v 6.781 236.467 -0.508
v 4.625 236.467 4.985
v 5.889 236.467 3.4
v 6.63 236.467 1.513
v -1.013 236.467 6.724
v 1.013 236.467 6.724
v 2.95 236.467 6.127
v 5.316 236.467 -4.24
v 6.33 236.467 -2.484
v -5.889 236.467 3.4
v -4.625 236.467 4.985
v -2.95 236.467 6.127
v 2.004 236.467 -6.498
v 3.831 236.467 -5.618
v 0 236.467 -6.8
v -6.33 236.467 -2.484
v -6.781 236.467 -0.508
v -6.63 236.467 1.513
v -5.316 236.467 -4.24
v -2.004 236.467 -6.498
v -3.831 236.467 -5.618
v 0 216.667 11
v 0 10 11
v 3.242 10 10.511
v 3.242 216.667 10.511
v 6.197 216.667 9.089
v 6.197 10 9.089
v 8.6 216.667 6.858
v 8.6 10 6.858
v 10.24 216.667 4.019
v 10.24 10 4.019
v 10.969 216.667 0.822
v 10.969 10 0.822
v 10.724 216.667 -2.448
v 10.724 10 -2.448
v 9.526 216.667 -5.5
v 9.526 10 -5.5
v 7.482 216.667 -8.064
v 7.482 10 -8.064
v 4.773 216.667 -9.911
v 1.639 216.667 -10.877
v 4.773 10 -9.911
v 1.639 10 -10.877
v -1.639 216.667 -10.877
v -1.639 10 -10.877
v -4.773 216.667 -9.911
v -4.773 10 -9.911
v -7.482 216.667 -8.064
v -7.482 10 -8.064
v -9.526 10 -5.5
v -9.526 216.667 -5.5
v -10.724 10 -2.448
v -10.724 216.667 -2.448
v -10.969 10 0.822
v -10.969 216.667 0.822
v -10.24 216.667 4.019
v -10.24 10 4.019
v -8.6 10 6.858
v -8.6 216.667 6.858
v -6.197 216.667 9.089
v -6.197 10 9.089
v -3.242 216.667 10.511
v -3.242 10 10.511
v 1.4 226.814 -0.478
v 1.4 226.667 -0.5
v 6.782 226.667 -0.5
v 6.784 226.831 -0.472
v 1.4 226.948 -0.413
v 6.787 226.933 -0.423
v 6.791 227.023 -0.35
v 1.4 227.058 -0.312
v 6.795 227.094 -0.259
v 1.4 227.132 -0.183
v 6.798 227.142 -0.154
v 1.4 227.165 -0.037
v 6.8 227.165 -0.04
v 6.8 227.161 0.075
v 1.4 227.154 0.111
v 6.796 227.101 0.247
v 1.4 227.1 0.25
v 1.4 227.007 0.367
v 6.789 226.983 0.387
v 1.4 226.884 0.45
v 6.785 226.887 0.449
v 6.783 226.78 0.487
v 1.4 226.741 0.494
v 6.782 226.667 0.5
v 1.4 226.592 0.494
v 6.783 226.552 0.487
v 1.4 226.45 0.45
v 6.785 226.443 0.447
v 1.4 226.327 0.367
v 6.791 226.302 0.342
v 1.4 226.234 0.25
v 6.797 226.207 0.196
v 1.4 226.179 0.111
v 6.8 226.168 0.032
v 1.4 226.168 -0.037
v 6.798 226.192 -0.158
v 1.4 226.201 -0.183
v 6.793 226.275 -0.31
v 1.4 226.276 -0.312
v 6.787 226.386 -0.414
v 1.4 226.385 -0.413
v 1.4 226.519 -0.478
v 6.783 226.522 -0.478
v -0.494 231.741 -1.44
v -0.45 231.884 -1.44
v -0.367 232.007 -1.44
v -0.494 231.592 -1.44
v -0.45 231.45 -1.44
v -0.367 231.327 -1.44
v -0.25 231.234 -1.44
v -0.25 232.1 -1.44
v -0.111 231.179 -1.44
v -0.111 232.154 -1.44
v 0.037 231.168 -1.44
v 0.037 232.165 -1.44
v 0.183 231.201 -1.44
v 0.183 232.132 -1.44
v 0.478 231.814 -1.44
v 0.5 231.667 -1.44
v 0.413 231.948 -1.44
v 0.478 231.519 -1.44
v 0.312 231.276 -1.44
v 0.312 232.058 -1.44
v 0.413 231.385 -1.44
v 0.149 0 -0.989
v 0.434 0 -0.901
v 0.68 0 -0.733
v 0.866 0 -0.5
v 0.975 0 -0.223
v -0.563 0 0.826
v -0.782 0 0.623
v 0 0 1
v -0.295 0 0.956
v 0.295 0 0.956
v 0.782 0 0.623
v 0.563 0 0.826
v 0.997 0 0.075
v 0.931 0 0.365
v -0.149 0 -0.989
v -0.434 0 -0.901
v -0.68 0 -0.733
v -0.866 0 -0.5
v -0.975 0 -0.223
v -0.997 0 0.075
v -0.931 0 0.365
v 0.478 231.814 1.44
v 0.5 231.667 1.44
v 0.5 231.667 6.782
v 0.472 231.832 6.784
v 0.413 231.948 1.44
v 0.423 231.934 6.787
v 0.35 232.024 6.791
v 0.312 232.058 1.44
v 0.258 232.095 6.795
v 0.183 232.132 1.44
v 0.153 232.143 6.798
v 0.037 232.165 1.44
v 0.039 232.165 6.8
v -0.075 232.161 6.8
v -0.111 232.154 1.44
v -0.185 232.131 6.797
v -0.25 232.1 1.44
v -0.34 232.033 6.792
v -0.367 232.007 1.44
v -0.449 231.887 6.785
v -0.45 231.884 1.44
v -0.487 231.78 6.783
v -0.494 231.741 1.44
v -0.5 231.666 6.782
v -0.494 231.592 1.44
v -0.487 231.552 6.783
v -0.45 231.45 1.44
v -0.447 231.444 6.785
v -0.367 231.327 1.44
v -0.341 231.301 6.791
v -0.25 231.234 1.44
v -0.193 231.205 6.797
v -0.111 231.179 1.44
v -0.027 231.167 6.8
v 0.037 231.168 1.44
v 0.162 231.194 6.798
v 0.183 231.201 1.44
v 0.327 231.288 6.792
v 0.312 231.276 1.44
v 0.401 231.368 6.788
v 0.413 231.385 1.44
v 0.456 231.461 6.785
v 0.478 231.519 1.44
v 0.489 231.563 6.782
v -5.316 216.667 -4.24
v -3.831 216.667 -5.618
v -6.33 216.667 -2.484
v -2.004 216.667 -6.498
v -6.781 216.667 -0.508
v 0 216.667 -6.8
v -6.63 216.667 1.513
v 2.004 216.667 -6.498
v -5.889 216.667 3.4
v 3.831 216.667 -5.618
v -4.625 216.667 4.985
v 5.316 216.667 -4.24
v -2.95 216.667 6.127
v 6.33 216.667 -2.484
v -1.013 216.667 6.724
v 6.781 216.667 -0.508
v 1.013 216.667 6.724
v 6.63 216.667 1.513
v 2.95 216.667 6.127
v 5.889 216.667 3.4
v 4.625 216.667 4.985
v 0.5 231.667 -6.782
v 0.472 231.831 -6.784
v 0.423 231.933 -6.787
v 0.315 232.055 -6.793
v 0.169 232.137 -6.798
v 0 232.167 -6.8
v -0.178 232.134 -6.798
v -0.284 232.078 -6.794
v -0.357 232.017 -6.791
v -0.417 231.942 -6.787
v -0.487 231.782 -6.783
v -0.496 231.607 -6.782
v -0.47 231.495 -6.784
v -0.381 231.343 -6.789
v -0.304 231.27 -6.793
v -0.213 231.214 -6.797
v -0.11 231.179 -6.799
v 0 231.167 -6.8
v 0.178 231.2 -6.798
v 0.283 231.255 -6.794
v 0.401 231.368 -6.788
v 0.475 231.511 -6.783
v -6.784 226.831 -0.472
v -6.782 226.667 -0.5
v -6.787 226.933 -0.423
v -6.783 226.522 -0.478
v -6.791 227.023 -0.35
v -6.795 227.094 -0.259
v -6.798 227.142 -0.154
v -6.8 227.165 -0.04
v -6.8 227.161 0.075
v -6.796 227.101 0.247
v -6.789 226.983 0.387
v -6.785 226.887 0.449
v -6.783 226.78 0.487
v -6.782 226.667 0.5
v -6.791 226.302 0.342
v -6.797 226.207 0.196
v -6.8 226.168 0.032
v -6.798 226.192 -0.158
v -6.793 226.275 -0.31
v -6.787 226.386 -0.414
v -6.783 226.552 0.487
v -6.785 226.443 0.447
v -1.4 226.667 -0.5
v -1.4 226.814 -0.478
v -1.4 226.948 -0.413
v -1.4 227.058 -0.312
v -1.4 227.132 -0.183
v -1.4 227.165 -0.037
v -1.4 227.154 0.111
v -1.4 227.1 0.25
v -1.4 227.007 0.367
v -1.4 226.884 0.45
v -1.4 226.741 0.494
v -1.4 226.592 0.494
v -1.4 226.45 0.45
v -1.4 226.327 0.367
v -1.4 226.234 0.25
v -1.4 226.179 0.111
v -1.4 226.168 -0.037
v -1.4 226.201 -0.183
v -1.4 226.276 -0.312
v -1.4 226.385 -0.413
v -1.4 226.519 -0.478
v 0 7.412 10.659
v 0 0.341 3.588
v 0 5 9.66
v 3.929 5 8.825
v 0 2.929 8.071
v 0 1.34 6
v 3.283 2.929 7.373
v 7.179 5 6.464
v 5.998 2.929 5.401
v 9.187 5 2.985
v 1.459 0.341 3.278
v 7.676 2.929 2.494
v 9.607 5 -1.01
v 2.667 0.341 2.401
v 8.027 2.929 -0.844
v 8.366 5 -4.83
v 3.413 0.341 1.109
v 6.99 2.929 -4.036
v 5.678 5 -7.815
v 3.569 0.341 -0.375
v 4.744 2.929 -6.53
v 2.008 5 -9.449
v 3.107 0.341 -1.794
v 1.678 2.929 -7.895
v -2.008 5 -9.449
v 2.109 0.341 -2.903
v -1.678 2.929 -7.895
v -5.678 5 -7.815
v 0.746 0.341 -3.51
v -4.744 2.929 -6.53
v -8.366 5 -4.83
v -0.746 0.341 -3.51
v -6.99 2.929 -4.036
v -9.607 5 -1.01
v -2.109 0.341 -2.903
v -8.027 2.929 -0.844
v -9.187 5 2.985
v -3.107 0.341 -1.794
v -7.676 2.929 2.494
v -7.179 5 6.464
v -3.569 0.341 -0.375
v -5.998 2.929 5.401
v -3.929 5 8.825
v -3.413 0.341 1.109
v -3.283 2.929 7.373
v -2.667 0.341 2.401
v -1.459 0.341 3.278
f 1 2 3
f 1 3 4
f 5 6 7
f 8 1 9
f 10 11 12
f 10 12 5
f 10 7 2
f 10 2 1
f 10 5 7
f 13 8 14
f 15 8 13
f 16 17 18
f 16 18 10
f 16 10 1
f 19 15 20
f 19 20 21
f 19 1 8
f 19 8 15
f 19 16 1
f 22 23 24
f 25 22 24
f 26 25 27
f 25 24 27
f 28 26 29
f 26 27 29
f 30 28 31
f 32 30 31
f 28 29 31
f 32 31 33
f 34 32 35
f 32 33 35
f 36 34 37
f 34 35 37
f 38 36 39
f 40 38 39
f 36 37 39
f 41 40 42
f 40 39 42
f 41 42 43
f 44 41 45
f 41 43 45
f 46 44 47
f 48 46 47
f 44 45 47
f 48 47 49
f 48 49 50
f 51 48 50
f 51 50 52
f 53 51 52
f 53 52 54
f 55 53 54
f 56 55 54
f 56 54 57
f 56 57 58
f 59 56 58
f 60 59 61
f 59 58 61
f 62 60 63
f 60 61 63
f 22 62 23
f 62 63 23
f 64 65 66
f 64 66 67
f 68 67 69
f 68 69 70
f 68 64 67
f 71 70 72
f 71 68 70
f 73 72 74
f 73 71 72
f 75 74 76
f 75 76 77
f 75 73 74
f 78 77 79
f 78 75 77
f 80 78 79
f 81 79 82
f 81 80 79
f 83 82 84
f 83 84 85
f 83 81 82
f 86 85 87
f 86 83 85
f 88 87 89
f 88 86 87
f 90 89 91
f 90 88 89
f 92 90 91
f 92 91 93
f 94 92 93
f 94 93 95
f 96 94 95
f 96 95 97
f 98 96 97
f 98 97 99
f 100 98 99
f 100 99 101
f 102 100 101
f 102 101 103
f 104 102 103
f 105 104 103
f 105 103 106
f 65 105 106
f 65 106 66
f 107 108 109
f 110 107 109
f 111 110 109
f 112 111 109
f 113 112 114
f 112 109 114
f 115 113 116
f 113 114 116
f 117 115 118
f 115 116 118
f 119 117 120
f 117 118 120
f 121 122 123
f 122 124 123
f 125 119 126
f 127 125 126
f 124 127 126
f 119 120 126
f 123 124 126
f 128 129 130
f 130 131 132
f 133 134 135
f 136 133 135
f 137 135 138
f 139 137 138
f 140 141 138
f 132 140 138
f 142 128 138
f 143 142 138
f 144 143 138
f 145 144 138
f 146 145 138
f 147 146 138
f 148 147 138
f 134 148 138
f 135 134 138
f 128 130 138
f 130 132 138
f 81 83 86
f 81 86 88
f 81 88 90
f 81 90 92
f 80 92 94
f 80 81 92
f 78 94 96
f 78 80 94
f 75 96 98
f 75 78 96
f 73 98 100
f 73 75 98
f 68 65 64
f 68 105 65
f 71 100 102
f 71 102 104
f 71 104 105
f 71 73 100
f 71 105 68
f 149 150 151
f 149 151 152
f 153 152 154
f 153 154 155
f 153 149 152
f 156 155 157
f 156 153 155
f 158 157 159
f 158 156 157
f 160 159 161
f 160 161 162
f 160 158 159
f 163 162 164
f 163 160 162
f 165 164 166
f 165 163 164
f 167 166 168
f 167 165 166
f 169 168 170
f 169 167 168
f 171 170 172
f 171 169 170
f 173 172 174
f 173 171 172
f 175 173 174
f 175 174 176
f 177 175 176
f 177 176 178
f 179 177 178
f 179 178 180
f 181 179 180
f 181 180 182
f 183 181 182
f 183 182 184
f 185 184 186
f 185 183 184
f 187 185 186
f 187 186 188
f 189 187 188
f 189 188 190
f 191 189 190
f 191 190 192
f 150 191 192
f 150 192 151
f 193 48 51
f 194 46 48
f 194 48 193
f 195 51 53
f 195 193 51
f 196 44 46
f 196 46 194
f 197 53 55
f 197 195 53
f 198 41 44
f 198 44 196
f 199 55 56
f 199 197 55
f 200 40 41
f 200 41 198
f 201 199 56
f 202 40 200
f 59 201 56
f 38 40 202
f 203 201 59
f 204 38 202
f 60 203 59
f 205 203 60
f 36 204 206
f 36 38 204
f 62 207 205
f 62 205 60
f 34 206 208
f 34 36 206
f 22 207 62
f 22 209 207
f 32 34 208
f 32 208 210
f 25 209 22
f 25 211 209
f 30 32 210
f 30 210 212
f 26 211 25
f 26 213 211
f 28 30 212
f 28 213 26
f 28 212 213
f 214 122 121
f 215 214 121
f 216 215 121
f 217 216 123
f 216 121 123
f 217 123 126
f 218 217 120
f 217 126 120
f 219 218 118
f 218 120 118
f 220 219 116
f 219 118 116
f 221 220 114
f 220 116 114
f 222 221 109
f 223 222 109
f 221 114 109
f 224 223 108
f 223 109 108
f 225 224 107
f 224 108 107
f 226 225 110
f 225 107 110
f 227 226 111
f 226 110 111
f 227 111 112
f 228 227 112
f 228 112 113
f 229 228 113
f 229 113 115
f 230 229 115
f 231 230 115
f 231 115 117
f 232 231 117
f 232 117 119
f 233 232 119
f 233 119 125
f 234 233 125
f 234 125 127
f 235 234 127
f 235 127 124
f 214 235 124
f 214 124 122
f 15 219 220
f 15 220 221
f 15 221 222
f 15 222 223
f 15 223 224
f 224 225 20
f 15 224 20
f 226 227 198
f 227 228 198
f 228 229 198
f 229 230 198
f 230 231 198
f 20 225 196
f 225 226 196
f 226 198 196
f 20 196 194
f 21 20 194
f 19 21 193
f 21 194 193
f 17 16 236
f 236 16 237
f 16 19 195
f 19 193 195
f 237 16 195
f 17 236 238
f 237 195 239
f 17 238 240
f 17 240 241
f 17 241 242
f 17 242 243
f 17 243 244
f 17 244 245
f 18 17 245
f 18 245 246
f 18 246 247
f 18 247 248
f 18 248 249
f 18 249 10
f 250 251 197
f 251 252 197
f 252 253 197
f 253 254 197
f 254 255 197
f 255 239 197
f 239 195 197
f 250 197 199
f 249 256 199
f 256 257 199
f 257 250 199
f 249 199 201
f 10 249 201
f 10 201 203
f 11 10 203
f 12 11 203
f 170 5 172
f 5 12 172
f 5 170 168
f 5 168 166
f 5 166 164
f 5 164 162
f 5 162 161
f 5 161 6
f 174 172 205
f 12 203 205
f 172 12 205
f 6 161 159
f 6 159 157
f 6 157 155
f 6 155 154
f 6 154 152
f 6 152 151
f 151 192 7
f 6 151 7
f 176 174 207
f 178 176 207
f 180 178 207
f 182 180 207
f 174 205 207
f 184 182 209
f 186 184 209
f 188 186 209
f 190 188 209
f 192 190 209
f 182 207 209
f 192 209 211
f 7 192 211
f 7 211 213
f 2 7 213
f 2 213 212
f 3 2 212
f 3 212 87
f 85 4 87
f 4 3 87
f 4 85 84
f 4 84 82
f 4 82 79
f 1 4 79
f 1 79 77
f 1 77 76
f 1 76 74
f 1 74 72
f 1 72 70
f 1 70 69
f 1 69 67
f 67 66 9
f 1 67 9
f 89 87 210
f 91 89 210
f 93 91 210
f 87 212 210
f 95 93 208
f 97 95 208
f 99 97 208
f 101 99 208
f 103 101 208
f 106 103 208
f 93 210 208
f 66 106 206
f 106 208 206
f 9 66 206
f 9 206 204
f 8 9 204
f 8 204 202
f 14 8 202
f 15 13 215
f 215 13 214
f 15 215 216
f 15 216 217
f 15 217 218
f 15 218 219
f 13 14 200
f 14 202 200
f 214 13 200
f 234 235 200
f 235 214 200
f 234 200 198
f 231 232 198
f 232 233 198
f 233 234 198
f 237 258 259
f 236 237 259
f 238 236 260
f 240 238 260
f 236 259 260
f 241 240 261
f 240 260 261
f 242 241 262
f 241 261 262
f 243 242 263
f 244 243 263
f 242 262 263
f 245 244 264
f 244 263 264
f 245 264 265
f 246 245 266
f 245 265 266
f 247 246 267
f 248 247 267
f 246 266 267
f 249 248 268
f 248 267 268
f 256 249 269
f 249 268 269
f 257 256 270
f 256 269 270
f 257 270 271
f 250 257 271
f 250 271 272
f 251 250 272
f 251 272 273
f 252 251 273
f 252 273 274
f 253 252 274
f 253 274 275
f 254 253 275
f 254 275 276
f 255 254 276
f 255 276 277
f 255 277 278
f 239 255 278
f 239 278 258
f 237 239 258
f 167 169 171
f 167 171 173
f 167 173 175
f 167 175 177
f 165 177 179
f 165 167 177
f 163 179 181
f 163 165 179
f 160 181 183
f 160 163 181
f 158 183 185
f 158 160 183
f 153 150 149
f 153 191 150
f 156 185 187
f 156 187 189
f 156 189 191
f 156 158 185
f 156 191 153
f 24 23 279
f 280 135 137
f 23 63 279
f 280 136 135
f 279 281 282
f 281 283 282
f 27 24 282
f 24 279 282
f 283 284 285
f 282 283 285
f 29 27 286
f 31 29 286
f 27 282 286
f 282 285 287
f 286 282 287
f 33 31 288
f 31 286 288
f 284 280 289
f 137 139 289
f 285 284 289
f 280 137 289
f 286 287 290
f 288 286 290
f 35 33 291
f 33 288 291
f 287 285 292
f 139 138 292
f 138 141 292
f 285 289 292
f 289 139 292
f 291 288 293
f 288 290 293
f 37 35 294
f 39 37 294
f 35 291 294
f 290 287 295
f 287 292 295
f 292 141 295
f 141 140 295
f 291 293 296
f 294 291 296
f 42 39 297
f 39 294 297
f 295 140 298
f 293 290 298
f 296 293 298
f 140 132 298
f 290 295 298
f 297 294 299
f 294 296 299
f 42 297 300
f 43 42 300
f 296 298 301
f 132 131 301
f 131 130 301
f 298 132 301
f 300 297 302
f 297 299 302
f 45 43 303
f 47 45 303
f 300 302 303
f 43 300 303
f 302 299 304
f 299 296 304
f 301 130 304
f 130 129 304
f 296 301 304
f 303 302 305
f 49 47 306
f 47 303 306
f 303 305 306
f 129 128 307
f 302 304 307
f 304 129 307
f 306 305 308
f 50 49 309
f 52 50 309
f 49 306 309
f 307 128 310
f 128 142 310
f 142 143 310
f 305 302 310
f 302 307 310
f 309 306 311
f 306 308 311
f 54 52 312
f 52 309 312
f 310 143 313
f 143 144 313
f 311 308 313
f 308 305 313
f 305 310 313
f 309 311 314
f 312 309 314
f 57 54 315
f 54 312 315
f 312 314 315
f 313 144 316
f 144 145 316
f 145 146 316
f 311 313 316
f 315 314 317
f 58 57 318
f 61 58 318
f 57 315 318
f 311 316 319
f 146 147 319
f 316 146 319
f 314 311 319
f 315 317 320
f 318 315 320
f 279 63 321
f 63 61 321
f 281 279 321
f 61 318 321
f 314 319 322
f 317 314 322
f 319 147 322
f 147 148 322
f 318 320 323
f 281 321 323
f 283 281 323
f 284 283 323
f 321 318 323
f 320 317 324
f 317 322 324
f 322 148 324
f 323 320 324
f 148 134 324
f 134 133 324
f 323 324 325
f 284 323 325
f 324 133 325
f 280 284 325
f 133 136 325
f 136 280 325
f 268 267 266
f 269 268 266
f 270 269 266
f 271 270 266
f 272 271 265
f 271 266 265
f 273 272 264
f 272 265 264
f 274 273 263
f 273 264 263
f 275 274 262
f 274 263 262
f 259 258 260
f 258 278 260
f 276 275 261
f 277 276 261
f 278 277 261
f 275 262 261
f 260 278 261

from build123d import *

# Parameters (mm, degrees)
SKETCH1_R           = 11
BOSS_EXTRUDE1_DEPTH = 216.66667
BOSS_EXTRUDE2_START = 216.66667
SKETCH2_R           = 6.8
BOSS_EXTRUDE2_DEPTH = 19.8
FILLET1_R           = 10
CUT_EXTRUDE1_START  = -1.44
SKETCH3_R           = 0.5
CUT_EXTRUDE1_DEPTH  = 9
CUT_EXTRUDE2_START  = -1.4
SKETCH4_R           = 0.5
CUT_EXTRUDE2_DEPTH  = 9


with BuildPart() as part:
    # Sketch1 → Boss-Extrude1 (new body)
    with BuildSketch(Plane(origin=(0, 0, 0), x_dir=(1, 0, 0), z_dir=(0, 1, 0))):
        with Locations(Location((0, 0, 0), (0, 0, 270))):
            Circle(SKETCH1_R)
    extrude(amount=BOSS_EXTRUDE1_DEPTH)

    # Sketch2 → Boss-Extrude2 (add)
    with BuildSketch(Plane(origin=(0, 0, 0), x_dir=(1, 0, 0), z_dir=(0, 1, 0)).offset(BOSS_EXTRUDE2_START)):
        with Locations(Location((0, 0, 0), (0, 0, 90))):
            Circle(SKETCH2_R)
    extrude(amount=BOSS_EXTRUDE2_DEPTH)

    # Fillet1
    fillet1_edges = [part.edges().sort_by_distance(p)[0] for p in [
        (0, 0, -11),
    ]]
    fillet(fillet1_edges, radius=FILLET1_R)

    # Sketch3 → Cut-Extrude1 (cut)
    with BuildSketch(Plane.XY.offset(CUT_EXTRUDE1_START)):
        with Locations((0, 231.66667)):
            Circle(SKETCH3_R)
    cut_extrude1 = extrude(amount=-CUT_EXTRUDE1_DEPTH, mode=Mode.SUBTRACT)

    # Mirror1: Cut-Extrude1 across plane
    add(cut_extrude1.mirror(Plane.XY), mode=Mode.SUBTRACT)

    # Sketch4 → Cut-Extrude2 (cut)
    with BuildSketch(Plane(origin=(0, 0, 0), x_dir=(0, 0, -1), z_dir=(1, 0, 0)).offset(CUT_EXTRUDE2_START)):
        with Locations((0, 226.66667)):
            Circle(SKETCH4_R)
    cut_extrude2 = extrude(amount=-CUT_EXTRUDE2_DEPTH, mode=Mode.SUBTRACT)

    # Mirror2: Cut-Extrude2 across plane
    add(cut_extrude2.mirror(Plane(origin=(0, 0, 0), x_dir=(0, 0, 1), z_dir=(1, 0, 0))), mode=Mode.SUBTRACT)


solid = part.part
